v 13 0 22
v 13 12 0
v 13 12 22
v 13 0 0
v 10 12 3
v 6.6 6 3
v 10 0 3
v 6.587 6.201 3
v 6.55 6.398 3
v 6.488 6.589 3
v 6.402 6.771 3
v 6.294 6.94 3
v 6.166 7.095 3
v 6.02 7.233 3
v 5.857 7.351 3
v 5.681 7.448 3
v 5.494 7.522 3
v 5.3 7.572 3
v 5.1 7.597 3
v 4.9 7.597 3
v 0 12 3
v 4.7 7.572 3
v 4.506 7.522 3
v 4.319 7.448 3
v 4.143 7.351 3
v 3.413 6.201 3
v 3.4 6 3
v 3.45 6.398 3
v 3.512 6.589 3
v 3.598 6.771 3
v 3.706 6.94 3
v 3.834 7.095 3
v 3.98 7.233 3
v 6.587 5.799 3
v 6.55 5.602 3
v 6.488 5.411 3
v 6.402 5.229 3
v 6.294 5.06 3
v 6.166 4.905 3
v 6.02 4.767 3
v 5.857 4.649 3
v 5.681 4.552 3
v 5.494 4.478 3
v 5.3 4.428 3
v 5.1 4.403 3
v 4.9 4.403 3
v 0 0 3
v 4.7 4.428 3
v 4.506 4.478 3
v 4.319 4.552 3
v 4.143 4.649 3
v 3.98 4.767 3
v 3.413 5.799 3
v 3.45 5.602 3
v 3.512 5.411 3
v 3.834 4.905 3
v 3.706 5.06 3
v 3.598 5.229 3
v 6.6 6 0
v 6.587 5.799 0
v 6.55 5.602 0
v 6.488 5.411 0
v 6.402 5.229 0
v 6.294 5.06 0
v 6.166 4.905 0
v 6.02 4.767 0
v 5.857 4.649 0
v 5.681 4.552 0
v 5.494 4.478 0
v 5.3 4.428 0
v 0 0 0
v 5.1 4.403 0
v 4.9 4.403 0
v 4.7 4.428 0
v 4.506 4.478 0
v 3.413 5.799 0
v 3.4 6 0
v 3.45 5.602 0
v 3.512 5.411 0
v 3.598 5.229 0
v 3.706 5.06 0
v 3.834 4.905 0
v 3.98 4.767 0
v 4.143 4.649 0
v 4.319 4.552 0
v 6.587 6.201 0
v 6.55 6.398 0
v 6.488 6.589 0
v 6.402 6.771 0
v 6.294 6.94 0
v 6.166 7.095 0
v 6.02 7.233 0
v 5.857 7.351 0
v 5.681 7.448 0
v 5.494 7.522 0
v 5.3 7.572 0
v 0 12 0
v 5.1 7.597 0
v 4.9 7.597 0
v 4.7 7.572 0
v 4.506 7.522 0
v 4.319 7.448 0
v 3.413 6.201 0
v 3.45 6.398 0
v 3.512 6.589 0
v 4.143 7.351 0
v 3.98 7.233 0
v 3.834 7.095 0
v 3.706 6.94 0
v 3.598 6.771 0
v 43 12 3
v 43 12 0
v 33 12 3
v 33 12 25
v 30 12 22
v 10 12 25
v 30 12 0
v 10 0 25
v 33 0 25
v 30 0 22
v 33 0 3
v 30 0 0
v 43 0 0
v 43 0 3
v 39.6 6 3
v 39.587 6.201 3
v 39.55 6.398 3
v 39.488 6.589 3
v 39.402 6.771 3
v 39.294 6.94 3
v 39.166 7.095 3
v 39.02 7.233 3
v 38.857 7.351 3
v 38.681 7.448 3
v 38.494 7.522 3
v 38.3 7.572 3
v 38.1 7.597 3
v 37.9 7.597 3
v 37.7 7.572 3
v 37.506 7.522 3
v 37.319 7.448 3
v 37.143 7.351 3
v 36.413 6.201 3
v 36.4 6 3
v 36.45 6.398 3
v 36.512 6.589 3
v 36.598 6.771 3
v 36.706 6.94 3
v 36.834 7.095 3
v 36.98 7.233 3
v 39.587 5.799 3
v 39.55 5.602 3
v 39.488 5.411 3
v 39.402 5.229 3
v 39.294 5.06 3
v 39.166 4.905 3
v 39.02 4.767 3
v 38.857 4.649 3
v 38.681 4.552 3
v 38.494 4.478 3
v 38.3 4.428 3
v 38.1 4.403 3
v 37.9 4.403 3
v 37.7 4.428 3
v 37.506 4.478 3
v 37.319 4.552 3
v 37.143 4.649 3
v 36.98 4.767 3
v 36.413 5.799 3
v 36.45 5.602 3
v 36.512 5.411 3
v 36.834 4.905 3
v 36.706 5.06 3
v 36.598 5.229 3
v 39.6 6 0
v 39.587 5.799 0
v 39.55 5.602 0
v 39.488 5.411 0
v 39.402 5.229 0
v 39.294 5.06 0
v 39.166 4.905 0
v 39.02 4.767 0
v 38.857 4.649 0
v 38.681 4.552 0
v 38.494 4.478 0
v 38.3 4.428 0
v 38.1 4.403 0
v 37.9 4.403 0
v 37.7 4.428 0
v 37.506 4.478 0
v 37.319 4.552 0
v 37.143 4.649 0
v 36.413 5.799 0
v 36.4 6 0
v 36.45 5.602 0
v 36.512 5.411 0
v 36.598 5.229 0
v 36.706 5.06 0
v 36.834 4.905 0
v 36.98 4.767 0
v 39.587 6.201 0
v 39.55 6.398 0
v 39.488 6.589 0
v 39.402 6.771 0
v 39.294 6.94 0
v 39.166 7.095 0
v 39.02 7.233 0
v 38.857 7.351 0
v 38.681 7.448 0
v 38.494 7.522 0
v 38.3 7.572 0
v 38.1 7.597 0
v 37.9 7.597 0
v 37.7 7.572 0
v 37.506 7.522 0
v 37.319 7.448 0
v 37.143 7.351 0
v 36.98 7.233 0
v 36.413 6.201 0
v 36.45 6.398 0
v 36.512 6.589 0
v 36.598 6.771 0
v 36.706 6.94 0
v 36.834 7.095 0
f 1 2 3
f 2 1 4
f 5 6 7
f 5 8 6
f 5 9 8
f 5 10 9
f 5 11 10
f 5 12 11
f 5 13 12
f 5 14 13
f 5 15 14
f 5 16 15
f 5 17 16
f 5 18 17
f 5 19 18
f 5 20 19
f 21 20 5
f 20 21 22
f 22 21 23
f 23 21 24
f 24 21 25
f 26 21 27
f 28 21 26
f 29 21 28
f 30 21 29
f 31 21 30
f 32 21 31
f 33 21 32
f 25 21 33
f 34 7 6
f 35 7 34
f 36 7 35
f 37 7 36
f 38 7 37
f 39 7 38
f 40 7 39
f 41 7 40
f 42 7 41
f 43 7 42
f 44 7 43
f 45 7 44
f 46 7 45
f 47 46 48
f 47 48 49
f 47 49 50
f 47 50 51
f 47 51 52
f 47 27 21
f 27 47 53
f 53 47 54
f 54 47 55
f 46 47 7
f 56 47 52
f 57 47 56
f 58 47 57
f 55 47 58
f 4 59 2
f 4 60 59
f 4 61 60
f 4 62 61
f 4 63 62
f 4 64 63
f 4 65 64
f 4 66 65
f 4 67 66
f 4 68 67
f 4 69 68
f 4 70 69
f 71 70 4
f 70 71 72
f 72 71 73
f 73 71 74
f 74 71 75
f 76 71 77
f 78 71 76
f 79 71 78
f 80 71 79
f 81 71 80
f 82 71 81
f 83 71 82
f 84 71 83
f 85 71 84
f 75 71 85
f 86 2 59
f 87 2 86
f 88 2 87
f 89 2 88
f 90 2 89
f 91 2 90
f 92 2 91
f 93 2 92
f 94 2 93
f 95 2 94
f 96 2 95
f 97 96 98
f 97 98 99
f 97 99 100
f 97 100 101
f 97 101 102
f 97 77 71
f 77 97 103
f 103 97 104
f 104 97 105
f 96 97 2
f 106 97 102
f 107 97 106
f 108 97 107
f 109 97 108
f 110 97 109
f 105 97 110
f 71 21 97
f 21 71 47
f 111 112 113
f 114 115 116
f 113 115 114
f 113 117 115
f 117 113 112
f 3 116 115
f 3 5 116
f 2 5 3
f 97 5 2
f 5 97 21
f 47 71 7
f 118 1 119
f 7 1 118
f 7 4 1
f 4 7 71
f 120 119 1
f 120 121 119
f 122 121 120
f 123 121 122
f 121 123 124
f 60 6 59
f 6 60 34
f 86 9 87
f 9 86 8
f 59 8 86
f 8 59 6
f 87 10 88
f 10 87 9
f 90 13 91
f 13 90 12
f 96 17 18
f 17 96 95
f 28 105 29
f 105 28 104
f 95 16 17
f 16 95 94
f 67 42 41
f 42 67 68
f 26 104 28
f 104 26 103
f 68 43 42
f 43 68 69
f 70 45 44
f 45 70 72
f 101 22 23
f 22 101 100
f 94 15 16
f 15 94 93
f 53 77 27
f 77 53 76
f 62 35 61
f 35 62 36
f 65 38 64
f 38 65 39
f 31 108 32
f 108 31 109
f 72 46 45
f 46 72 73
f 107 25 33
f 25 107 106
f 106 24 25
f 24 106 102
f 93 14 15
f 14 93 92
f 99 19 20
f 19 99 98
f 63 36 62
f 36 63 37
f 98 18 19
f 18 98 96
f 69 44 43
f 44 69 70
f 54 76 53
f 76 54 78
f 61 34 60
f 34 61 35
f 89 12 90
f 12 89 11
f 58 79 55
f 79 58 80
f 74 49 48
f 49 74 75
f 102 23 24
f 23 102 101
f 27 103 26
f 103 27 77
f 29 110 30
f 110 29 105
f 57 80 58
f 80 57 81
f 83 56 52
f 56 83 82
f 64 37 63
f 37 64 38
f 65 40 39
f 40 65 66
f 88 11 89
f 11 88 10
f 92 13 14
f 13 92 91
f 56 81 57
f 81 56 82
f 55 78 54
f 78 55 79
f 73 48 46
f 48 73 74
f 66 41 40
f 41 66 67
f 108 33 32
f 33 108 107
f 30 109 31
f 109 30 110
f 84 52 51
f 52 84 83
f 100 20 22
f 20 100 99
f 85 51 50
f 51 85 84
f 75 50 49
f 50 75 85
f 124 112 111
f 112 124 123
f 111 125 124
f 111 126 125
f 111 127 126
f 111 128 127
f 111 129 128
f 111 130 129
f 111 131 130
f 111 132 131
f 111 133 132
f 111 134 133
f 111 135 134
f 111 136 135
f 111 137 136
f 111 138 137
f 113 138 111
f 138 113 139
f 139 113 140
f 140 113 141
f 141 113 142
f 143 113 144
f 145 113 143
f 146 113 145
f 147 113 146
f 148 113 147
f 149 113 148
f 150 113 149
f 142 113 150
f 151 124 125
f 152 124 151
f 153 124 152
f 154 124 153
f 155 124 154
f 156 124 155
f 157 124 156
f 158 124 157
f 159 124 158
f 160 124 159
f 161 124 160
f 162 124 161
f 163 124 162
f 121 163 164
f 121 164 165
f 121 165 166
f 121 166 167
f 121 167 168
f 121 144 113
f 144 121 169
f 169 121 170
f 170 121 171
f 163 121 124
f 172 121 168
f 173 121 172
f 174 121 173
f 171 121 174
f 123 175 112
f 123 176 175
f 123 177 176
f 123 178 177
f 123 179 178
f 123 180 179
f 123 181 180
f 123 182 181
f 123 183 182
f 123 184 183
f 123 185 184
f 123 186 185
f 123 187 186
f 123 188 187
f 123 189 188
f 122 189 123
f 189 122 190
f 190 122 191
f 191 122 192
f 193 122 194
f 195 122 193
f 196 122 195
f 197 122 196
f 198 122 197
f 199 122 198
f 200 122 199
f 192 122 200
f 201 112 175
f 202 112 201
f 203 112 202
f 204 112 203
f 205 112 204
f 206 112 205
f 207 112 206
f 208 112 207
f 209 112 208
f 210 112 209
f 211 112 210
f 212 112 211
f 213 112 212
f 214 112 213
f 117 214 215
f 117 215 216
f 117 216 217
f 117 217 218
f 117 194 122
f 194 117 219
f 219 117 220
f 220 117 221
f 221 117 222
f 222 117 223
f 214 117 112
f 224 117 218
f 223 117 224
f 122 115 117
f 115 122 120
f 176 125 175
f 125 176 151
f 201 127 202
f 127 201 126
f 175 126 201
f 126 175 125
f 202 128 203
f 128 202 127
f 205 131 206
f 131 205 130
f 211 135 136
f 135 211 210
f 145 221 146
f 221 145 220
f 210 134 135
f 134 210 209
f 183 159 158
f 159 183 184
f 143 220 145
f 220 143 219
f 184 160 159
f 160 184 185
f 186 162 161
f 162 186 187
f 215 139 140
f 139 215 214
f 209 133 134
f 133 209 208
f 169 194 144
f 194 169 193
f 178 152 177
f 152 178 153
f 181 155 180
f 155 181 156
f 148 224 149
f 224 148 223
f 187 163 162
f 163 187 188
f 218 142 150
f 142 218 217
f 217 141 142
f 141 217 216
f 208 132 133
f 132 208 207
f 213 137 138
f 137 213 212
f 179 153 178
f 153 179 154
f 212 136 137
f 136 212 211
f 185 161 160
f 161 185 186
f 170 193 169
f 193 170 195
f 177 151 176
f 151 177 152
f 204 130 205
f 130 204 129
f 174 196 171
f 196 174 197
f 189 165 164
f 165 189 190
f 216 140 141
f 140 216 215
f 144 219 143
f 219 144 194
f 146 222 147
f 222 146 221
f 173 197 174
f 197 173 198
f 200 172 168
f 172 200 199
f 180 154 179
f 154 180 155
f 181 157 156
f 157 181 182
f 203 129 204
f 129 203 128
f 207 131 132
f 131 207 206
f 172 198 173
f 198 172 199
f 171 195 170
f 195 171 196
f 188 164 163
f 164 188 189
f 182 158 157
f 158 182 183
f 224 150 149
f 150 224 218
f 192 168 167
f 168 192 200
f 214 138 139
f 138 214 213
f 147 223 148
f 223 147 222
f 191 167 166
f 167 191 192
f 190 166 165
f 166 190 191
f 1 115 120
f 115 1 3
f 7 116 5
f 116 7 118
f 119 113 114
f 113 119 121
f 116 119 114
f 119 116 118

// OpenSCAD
$fn = 50;

// left leg
difference() {
	cube([13, 12, 3]);
	translate([5, 6, 0])
		cylinder(r = 1.6, h = 6);
}

// right leg
translate([30, 0, 0])
difference() {
	cube([13, 12, 3]);
	translate([8, 6, 0])
		cylinder(r = 1.6, h = 6);
}

// left upright
translate([10, 0, 0])
cube([3, 12, 22]);

// right upright
translate([30, 0, 0])
cube([3, 12, 22]);

// crossbar
translate([10, 0, 22])
cube([23, 12, 3]);
